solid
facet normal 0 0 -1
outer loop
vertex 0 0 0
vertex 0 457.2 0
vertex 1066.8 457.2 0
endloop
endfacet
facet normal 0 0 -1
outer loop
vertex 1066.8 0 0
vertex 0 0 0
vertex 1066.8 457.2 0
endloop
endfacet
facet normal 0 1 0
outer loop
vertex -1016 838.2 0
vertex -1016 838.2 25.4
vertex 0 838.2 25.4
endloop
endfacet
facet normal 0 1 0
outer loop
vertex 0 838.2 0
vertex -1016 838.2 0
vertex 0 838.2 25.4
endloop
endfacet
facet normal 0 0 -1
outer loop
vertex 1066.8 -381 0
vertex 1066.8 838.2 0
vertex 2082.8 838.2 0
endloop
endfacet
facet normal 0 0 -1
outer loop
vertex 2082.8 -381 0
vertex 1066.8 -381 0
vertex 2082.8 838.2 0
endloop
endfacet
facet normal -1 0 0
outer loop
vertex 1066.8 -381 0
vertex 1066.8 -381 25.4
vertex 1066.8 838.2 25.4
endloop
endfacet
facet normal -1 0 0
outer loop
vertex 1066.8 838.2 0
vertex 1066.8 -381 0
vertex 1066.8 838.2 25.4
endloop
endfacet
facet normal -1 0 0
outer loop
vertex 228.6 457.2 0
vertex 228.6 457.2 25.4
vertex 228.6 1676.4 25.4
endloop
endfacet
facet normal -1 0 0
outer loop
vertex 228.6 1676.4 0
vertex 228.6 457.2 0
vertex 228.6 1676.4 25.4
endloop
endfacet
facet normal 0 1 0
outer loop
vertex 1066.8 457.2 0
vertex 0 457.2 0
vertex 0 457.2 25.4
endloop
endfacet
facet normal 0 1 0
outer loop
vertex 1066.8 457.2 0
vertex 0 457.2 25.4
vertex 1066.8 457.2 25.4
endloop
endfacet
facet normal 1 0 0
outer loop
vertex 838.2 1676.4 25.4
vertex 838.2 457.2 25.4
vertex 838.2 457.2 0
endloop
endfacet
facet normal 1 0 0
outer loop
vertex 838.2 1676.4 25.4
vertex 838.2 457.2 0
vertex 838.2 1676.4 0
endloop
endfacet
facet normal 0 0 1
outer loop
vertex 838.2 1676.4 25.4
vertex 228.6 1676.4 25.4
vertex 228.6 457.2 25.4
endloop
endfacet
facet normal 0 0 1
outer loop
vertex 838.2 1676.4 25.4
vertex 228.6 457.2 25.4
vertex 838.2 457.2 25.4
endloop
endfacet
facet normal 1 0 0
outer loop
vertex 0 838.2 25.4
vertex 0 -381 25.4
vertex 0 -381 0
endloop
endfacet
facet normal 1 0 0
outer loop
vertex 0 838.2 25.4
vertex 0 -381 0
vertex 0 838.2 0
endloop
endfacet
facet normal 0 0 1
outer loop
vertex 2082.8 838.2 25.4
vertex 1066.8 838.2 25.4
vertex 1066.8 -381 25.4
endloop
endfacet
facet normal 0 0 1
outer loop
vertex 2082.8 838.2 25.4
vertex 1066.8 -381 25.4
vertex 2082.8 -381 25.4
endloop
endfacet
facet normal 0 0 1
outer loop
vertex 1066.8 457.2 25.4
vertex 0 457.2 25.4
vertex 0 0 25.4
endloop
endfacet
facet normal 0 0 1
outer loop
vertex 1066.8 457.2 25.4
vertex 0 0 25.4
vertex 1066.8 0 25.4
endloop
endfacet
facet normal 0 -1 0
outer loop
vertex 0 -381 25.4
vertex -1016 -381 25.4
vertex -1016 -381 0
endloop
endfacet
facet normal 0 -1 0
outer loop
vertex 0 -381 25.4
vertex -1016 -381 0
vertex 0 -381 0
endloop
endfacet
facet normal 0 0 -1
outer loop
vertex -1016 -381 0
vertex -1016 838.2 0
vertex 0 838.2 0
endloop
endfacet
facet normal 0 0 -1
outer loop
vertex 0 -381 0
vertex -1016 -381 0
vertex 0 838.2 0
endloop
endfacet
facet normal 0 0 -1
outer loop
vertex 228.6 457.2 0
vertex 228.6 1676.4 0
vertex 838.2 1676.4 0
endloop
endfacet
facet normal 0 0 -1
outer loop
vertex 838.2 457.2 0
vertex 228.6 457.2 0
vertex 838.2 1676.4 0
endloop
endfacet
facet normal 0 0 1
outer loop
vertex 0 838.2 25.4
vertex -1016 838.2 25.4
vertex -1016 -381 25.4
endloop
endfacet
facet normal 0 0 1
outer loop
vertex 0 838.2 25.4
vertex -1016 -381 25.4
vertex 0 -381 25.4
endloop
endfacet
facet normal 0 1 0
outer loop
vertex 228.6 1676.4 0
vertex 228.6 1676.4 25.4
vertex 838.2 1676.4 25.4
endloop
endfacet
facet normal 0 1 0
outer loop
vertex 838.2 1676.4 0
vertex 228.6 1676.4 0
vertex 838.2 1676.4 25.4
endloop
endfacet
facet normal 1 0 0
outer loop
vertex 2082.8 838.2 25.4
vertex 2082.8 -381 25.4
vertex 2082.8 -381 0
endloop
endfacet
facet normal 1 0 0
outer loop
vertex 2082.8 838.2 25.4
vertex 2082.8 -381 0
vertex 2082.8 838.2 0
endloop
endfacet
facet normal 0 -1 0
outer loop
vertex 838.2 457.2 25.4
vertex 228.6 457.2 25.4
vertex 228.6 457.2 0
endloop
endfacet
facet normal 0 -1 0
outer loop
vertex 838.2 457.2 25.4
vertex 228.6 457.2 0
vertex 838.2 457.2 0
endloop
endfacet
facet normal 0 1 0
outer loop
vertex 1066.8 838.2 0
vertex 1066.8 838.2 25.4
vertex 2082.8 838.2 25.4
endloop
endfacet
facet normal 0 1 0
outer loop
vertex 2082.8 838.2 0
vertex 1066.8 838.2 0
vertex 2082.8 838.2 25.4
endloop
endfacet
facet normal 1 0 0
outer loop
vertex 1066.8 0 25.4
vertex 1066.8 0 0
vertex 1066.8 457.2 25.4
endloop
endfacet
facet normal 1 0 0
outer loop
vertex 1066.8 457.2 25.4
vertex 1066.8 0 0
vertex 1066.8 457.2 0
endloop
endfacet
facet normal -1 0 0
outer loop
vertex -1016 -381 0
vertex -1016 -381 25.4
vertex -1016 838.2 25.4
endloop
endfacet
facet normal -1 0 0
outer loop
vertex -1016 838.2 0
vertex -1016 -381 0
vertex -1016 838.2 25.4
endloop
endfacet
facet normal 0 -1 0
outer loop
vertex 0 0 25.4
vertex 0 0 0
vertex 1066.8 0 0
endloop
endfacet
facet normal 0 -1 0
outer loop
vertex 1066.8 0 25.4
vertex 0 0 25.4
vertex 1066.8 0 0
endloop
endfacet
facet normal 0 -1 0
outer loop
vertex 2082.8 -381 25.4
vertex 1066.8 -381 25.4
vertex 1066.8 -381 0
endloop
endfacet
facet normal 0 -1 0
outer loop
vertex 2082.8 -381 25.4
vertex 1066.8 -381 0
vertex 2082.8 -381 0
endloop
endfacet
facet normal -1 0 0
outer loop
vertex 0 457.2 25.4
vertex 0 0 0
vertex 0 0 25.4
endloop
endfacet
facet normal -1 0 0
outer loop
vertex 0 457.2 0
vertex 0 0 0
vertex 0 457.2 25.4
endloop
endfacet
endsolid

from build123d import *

# Parameters (mm, degrees)
F0_W     = 1066.8
F0_H     = 457.2
F1_DEPTH = 25.4
F2_W     = 1016
F2_H     = 1219.2
F3_DEPTH = 25.4
F4_W     = 609.6
F4_H     = 1219.2
F5_DEPTH = 25.4


with BuildPart() as f1:
    # F0 (on Top) → F1 (new body)
    with BuildSketch(Plane.XY):
        with Locations((533.4, 228.6)):
            Rectangle(F0_W, F0_H)
    extrude(amount=F1_DEPTH)


with BuildPart() as f3:
    # F2 (on face) → F3 (new body)
    with BuildSketch(Plane.XY.offset(25.4)):
        with Locations((-508, 228.6)):
            Rectangle(F2_W, F2_H)
        with Locations((1574.8, 228.6)):
            Rectangle(F2_W, F2_H)
    extrude(amount=-F3_DEPTH)


with BuildPart() as f5:
    # F4 (on face) → F5 (new body)
    with BuildSketch(Plane.XY.offset(25.4)):
        with Locations((533.4, 1066.8)):
            Rectangle(F4_W, F4_H)
    extrude(amount=-F5_DEPTH)


solid = Compound([f1.part, f3.part, f5.part])
